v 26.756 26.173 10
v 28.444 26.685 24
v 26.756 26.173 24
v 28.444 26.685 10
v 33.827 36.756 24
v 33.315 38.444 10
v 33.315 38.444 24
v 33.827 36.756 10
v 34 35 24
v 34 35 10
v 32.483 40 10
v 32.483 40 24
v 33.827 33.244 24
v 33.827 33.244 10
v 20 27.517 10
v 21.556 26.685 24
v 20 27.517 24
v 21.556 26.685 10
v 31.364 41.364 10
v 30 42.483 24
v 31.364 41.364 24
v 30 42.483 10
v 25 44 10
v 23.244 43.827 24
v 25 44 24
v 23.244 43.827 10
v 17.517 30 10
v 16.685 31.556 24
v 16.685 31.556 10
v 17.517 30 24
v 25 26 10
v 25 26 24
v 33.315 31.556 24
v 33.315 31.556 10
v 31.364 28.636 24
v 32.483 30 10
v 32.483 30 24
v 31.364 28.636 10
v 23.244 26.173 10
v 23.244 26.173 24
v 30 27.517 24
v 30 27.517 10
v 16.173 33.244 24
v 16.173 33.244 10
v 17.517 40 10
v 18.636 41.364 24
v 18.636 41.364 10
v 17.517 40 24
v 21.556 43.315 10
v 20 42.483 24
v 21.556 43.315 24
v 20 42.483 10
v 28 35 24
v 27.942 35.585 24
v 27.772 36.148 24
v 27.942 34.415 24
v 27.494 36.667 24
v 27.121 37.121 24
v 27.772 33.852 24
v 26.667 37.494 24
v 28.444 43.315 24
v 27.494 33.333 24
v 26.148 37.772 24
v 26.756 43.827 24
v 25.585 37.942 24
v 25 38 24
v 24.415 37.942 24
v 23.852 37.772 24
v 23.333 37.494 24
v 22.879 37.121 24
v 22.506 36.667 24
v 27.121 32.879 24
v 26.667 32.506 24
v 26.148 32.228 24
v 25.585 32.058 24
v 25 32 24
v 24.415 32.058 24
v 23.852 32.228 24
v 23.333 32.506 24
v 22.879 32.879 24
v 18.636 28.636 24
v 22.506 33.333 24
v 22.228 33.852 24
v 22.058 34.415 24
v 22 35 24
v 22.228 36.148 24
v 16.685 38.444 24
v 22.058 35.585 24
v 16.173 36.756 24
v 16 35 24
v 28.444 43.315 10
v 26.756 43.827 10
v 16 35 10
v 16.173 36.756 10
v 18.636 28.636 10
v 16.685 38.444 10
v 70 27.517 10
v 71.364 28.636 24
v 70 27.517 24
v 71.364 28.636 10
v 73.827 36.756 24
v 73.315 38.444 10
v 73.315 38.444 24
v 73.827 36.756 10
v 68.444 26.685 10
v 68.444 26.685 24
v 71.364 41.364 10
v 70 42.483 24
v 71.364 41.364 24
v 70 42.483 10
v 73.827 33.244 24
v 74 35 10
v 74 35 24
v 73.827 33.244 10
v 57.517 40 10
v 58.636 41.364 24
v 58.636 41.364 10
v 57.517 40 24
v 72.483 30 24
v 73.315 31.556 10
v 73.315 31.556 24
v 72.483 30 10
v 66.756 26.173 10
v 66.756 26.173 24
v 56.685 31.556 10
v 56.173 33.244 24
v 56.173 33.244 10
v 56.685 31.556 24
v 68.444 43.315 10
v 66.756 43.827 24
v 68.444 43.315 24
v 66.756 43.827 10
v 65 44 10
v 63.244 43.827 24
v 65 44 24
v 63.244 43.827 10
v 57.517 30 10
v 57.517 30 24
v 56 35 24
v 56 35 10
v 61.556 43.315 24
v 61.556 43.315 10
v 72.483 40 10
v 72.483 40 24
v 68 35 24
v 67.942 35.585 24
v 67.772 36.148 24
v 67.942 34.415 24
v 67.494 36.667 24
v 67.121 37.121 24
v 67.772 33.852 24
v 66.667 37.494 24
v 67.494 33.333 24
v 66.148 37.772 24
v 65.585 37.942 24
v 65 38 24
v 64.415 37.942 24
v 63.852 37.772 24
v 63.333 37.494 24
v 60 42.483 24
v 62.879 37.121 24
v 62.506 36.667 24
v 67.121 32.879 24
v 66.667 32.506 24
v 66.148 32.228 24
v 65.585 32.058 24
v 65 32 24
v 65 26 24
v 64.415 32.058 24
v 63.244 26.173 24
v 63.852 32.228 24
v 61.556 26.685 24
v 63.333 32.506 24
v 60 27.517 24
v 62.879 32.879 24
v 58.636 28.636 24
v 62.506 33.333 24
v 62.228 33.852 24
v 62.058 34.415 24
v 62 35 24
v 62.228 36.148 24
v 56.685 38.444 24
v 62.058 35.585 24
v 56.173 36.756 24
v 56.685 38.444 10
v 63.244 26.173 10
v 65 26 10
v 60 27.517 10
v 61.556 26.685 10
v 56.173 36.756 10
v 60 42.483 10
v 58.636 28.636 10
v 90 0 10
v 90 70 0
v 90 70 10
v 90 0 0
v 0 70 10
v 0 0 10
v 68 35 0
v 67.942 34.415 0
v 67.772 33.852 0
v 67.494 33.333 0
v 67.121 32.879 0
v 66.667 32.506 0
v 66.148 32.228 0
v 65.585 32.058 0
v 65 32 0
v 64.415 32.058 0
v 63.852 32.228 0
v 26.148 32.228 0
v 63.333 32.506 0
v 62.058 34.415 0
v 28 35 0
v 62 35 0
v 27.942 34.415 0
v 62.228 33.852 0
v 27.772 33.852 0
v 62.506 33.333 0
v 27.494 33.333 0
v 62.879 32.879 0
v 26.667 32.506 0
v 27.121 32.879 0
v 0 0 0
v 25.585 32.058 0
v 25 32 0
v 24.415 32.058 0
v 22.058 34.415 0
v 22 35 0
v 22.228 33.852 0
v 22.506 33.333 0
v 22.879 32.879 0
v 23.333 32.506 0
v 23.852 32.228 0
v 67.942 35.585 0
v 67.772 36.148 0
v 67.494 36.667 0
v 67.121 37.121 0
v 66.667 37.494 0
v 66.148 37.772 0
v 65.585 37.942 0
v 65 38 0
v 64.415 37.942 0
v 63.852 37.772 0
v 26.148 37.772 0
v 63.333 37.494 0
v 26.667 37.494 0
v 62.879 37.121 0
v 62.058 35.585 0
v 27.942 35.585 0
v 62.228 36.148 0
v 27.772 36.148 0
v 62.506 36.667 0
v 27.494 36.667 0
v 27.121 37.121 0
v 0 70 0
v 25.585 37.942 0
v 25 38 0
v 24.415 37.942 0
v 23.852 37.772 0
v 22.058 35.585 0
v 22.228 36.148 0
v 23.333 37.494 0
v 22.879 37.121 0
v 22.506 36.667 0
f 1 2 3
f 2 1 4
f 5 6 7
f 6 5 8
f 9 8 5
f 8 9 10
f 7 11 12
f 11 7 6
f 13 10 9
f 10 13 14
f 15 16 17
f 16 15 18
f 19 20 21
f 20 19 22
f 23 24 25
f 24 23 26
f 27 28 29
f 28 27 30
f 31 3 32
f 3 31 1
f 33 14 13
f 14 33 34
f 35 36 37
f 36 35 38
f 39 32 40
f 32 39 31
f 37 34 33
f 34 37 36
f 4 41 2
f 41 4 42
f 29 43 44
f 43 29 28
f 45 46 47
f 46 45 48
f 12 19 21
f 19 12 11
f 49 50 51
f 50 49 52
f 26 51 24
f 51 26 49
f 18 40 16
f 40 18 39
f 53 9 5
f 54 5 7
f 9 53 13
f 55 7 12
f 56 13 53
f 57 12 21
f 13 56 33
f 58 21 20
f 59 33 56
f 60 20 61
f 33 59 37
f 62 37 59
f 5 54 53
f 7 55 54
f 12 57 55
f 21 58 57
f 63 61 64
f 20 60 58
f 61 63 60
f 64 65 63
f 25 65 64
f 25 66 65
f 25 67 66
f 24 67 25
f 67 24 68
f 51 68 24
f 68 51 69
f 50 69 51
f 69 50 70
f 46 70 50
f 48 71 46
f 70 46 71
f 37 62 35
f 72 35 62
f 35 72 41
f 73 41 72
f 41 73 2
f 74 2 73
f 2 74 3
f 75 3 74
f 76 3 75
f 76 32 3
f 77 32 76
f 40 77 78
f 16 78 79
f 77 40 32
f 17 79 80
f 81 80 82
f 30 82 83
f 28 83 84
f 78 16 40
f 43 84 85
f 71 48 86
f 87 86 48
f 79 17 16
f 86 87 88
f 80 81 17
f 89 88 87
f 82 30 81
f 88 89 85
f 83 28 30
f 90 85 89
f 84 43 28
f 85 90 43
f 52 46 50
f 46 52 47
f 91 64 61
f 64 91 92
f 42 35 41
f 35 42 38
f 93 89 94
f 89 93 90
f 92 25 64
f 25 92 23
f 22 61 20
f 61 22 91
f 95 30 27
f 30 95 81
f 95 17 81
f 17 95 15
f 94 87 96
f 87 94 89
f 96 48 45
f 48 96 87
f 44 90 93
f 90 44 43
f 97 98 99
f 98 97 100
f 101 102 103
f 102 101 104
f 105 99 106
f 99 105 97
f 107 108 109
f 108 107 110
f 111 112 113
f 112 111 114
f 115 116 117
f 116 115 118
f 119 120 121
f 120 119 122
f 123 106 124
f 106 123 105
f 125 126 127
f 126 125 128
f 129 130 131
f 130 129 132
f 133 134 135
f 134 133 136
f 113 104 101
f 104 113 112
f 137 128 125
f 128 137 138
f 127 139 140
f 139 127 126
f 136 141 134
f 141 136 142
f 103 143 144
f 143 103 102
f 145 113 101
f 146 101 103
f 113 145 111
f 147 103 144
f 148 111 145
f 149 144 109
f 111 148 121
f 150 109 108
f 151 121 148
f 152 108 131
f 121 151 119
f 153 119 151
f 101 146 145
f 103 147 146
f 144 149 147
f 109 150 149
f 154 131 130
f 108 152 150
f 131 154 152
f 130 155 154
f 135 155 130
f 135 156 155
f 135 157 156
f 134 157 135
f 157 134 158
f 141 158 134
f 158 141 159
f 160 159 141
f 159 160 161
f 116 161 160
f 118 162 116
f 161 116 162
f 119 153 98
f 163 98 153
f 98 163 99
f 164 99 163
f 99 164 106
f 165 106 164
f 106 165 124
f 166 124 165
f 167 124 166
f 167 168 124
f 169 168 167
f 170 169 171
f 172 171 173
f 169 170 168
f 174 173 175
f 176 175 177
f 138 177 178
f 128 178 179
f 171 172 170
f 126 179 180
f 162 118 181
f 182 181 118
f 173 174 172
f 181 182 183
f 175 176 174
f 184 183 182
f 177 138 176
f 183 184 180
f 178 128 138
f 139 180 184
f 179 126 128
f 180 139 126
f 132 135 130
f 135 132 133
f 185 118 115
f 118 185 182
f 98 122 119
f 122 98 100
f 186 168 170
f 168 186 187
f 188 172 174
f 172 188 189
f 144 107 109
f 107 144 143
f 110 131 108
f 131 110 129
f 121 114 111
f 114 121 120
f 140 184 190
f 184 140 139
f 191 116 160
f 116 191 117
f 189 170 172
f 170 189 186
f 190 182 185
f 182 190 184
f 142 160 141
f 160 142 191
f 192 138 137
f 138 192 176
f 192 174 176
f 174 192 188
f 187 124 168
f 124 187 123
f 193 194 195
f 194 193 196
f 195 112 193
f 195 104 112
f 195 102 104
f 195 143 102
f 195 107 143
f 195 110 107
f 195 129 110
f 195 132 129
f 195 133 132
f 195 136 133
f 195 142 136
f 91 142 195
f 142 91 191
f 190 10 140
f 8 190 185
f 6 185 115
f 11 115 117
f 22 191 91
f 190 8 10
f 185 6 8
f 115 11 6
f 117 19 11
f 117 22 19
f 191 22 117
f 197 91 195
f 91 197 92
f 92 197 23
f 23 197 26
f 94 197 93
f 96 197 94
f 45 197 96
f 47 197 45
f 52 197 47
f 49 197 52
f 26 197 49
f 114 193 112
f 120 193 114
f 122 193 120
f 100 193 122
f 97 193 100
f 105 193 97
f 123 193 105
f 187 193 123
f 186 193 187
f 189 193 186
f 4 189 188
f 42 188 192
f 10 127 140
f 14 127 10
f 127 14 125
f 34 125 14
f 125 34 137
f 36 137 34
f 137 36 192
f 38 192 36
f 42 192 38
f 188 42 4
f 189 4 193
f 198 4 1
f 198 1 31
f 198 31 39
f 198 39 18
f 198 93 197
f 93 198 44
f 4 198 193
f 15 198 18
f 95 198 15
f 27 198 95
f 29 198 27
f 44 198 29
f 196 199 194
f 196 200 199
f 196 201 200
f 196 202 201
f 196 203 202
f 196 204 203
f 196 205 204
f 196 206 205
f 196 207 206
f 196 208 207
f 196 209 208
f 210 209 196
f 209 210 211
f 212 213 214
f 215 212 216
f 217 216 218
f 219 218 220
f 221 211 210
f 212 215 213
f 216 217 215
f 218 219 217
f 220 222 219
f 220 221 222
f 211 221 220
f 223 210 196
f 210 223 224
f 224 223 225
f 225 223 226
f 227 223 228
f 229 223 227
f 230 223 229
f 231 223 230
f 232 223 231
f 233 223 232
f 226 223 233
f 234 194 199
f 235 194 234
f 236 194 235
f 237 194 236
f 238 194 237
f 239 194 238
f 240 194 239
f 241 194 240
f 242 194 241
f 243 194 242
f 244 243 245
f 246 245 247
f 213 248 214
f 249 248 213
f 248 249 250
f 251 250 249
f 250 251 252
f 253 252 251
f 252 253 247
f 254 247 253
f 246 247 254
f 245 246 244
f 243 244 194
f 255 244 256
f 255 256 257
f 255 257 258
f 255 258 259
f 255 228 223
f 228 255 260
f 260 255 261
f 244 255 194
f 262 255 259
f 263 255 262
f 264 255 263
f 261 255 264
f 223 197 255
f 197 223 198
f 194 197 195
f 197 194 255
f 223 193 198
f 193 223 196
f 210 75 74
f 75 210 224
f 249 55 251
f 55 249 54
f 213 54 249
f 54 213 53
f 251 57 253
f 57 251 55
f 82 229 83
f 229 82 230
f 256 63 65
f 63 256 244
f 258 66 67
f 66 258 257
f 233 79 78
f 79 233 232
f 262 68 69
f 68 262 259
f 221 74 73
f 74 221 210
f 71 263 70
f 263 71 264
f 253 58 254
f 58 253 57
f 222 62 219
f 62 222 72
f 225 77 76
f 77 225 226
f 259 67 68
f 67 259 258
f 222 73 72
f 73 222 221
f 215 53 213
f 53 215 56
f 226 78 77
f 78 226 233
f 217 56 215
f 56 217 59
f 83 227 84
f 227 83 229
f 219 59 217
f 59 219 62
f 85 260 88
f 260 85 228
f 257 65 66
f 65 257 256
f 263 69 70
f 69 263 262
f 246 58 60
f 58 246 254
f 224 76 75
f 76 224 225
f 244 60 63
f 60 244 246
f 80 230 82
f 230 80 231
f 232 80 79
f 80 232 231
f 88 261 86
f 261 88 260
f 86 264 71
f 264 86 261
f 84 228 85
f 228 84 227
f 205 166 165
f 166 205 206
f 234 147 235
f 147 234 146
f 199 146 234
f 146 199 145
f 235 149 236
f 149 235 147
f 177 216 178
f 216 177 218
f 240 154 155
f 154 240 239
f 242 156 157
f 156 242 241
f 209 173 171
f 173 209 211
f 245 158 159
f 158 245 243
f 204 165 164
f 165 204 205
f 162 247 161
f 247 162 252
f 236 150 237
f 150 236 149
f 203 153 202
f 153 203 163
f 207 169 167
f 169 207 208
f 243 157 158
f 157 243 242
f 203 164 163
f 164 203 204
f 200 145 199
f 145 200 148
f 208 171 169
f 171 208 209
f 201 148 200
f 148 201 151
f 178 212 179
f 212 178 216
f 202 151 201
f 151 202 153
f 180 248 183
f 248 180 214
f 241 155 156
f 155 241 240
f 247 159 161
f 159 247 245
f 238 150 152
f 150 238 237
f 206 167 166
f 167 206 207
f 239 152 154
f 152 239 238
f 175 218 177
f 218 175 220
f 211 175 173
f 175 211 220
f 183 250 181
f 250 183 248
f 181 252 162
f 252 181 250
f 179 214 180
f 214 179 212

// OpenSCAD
$fn = 32;

// ----------------------------------------------------------------------
// Drill jig: two_boss jig
// ----------------------------------------------------------------------

// --- parameters (mm) ---
plate_l = 90;             // plate length, X
plate_w = 70;             // plate width, Y
plate_t = 10;             // plate thickness
boss_d = 18;              // guide boss diameter
boss_h = 15;              // boss height above the plate
guide_d = 6;              // guide hole diameter
boss_pitch = 40;          // boss pitch
fit_tol = 0.05;           // tolerance for press fits, mm
free_tol = 0.3;           // tolerance for clearance fits, mm

n_boss = 2;  // guide bosses
boss_x0 = (plate_l - (n_boss - 1) * boss_pitch) / 2;  // first boss X
boss_top = plate_t - 1 + boss_h;  // boss crown height
total_h = boss_top;  // overall height

difference() {
  union() {
  cube([plate_l, plate_w, plate_t]);
  for (i = [0 : n_boss - 1])
    translate([boss_x0 + i * boss_pitch, plate_w / 2, plate_t - 1])
      cylinder(h = boss_h, d = boss_d);
  }
  for (i = [0 : n_boss - 1])
    translate([boss_x0 + i * boss_pitch, plate_w / 2, -1])
      cylinder(h = plate_t + boss_h, d = guide_d);
}
